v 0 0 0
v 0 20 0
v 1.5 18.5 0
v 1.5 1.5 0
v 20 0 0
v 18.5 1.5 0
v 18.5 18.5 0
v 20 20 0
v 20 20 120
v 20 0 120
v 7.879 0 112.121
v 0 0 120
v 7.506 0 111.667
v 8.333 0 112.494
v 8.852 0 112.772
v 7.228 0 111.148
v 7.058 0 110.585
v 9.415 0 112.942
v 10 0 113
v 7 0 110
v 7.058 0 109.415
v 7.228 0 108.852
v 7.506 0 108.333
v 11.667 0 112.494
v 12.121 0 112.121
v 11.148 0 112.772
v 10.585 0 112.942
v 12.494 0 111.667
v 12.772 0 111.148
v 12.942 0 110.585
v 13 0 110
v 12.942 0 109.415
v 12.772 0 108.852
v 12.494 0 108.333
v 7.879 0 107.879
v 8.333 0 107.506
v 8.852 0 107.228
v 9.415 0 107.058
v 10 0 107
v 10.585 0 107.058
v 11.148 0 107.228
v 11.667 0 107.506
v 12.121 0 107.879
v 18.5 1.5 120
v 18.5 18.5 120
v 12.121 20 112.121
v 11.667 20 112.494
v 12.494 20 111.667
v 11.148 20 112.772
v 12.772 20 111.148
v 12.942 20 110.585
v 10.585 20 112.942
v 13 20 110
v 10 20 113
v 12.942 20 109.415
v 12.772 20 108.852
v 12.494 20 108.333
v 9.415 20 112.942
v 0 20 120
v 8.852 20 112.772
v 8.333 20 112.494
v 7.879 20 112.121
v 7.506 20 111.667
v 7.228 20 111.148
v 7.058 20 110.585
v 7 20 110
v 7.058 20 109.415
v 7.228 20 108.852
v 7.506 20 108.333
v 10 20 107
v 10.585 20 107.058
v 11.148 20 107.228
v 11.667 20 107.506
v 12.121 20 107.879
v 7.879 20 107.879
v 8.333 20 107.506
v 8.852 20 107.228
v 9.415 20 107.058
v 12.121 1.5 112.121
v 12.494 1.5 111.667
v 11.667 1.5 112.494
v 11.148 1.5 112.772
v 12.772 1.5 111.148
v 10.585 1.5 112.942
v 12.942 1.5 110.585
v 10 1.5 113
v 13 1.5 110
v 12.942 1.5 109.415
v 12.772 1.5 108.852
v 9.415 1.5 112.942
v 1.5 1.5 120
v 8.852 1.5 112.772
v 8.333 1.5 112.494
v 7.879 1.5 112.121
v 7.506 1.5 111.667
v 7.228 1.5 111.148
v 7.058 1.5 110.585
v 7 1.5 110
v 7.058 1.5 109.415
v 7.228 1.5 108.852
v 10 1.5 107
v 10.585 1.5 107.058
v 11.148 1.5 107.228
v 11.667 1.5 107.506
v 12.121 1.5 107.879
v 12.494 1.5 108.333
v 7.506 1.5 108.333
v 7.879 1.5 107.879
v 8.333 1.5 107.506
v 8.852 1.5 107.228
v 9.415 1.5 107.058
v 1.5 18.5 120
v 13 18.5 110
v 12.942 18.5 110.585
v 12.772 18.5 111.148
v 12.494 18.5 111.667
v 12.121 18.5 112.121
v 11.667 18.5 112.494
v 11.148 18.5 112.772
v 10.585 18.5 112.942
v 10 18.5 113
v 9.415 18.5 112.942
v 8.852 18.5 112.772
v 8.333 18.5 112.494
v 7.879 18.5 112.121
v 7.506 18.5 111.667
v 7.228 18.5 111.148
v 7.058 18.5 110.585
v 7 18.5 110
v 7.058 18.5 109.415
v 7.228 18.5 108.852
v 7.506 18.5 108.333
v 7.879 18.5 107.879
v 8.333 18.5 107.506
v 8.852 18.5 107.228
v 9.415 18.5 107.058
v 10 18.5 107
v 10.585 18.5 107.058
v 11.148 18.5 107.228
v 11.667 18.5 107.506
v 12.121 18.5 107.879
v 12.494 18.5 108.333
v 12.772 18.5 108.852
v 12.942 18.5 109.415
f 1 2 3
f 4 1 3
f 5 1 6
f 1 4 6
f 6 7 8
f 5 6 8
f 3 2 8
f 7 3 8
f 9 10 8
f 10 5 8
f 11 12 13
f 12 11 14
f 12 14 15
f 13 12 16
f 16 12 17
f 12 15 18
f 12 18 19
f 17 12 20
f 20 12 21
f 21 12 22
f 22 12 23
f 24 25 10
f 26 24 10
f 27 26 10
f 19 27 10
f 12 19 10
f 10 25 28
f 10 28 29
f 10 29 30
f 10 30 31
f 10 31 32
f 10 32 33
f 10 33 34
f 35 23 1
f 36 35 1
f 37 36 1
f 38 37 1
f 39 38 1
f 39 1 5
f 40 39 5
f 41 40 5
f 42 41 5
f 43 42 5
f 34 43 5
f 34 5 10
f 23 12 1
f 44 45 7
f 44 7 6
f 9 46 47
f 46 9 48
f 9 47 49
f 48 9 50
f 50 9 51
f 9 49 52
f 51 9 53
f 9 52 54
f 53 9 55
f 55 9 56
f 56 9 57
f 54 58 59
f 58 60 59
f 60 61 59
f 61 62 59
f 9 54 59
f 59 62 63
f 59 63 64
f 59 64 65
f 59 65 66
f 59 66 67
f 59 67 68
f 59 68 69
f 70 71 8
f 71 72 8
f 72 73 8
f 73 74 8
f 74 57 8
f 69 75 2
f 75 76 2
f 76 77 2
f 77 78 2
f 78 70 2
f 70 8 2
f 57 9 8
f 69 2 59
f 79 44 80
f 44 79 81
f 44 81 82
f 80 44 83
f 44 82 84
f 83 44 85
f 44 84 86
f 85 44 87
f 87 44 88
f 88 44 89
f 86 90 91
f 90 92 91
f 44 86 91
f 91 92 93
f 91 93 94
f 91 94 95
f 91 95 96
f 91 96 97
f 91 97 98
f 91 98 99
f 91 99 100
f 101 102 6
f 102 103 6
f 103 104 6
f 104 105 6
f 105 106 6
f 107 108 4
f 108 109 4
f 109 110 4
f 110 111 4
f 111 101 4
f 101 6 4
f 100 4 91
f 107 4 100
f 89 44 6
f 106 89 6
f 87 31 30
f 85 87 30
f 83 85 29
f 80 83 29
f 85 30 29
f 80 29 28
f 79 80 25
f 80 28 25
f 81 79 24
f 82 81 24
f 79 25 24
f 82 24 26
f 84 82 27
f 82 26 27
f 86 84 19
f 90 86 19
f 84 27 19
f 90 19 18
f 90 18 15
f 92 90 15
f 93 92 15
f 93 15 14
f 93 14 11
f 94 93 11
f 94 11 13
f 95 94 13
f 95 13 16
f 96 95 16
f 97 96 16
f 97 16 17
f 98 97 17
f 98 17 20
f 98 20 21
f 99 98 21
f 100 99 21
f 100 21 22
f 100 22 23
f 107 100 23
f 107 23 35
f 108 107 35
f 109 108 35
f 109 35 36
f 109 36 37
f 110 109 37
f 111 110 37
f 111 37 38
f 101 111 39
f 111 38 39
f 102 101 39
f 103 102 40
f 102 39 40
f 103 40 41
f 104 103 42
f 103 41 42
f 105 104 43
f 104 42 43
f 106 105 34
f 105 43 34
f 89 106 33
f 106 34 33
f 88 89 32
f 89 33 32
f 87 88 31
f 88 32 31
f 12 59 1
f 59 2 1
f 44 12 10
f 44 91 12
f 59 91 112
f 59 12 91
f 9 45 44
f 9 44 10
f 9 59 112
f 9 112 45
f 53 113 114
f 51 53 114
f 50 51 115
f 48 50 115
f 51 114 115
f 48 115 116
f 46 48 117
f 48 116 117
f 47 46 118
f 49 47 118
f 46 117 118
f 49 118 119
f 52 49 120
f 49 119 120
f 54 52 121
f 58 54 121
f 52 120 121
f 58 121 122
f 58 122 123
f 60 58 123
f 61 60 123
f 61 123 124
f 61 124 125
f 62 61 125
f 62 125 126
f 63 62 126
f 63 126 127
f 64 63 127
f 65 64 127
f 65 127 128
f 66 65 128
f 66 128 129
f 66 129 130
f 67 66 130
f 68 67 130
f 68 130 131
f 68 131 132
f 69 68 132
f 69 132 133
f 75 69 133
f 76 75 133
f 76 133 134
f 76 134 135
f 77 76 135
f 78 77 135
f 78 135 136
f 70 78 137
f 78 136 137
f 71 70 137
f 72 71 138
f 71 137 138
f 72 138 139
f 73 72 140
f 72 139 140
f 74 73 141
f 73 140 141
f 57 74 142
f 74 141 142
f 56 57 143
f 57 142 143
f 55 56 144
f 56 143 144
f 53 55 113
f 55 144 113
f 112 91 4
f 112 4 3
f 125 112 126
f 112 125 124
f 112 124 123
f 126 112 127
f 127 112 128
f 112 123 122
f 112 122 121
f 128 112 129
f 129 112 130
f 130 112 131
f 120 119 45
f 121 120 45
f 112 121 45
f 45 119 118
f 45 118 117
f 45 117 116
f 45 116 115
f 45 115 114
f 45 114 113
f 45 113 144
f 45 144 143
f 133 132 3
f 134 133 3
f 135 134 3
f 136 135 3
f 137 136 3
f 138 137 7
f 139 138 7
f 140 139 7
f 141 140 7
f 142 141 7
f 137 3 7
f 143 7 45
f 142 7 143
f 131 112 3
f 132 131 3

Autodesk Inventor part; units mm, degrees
ref_plane "YZ Plane" through (0, 0, 0) normal (1, 0, 0) x (0, 1, 0)
ref_plane "XZ Plane" through (0, 0, 0) normal (0, 1, 0) x (-1, 0, 0)
ref_plane "XY Plane" through (0, 0, 0) normal (0, 0, 1) x (1, 0, 0)
sketch "Эскиз1" plane through (0, 0, 0) normal (0, 0, 1) x (1, 0, 0)
  line L0 (0, 0) -> (20, 0)
  line L1 (20, 0) -> (20, 20)
  line L2 (20, 20) -> (0, 20)
  line L3 (0, 20) -> (0, 0)
  line L4 (1.5, 18.5) -> (18.5, 18.5)
  line L5 (18.5, 18.5) -> (18.5, 1.5)
  line L6 (18.5, 1.5) -> (1.5, 1.5)
  line L7 (1.5, 1.5) -> (1.5, 18.5)
  dimension "d0" = 1.5
  dimension "d1" = 20
  dimension "d2" = 20
extrude "Выдавливание1" add sketch "Эскиз1" along normal blind 120
sketch "Эскиз2" plane through (0, 0, 0) normal (0, -1, 0) x (1, 0, 0)
  circle A0 centre (10, 110) radius 3
  line L0 (20, 0) -> (20, 120) projected
  line L1 (0, 120) -> (20, 120) projected
  point P0 (0, 0)
  point P1 (10, 120)
  dimension "d5" = 6
  dimension "d7" = 10
extrude "Выдавливание2" cut sketch "Эскиз2" against normal through all
equation "\"d1\" = d2"
properties part number "arm"
